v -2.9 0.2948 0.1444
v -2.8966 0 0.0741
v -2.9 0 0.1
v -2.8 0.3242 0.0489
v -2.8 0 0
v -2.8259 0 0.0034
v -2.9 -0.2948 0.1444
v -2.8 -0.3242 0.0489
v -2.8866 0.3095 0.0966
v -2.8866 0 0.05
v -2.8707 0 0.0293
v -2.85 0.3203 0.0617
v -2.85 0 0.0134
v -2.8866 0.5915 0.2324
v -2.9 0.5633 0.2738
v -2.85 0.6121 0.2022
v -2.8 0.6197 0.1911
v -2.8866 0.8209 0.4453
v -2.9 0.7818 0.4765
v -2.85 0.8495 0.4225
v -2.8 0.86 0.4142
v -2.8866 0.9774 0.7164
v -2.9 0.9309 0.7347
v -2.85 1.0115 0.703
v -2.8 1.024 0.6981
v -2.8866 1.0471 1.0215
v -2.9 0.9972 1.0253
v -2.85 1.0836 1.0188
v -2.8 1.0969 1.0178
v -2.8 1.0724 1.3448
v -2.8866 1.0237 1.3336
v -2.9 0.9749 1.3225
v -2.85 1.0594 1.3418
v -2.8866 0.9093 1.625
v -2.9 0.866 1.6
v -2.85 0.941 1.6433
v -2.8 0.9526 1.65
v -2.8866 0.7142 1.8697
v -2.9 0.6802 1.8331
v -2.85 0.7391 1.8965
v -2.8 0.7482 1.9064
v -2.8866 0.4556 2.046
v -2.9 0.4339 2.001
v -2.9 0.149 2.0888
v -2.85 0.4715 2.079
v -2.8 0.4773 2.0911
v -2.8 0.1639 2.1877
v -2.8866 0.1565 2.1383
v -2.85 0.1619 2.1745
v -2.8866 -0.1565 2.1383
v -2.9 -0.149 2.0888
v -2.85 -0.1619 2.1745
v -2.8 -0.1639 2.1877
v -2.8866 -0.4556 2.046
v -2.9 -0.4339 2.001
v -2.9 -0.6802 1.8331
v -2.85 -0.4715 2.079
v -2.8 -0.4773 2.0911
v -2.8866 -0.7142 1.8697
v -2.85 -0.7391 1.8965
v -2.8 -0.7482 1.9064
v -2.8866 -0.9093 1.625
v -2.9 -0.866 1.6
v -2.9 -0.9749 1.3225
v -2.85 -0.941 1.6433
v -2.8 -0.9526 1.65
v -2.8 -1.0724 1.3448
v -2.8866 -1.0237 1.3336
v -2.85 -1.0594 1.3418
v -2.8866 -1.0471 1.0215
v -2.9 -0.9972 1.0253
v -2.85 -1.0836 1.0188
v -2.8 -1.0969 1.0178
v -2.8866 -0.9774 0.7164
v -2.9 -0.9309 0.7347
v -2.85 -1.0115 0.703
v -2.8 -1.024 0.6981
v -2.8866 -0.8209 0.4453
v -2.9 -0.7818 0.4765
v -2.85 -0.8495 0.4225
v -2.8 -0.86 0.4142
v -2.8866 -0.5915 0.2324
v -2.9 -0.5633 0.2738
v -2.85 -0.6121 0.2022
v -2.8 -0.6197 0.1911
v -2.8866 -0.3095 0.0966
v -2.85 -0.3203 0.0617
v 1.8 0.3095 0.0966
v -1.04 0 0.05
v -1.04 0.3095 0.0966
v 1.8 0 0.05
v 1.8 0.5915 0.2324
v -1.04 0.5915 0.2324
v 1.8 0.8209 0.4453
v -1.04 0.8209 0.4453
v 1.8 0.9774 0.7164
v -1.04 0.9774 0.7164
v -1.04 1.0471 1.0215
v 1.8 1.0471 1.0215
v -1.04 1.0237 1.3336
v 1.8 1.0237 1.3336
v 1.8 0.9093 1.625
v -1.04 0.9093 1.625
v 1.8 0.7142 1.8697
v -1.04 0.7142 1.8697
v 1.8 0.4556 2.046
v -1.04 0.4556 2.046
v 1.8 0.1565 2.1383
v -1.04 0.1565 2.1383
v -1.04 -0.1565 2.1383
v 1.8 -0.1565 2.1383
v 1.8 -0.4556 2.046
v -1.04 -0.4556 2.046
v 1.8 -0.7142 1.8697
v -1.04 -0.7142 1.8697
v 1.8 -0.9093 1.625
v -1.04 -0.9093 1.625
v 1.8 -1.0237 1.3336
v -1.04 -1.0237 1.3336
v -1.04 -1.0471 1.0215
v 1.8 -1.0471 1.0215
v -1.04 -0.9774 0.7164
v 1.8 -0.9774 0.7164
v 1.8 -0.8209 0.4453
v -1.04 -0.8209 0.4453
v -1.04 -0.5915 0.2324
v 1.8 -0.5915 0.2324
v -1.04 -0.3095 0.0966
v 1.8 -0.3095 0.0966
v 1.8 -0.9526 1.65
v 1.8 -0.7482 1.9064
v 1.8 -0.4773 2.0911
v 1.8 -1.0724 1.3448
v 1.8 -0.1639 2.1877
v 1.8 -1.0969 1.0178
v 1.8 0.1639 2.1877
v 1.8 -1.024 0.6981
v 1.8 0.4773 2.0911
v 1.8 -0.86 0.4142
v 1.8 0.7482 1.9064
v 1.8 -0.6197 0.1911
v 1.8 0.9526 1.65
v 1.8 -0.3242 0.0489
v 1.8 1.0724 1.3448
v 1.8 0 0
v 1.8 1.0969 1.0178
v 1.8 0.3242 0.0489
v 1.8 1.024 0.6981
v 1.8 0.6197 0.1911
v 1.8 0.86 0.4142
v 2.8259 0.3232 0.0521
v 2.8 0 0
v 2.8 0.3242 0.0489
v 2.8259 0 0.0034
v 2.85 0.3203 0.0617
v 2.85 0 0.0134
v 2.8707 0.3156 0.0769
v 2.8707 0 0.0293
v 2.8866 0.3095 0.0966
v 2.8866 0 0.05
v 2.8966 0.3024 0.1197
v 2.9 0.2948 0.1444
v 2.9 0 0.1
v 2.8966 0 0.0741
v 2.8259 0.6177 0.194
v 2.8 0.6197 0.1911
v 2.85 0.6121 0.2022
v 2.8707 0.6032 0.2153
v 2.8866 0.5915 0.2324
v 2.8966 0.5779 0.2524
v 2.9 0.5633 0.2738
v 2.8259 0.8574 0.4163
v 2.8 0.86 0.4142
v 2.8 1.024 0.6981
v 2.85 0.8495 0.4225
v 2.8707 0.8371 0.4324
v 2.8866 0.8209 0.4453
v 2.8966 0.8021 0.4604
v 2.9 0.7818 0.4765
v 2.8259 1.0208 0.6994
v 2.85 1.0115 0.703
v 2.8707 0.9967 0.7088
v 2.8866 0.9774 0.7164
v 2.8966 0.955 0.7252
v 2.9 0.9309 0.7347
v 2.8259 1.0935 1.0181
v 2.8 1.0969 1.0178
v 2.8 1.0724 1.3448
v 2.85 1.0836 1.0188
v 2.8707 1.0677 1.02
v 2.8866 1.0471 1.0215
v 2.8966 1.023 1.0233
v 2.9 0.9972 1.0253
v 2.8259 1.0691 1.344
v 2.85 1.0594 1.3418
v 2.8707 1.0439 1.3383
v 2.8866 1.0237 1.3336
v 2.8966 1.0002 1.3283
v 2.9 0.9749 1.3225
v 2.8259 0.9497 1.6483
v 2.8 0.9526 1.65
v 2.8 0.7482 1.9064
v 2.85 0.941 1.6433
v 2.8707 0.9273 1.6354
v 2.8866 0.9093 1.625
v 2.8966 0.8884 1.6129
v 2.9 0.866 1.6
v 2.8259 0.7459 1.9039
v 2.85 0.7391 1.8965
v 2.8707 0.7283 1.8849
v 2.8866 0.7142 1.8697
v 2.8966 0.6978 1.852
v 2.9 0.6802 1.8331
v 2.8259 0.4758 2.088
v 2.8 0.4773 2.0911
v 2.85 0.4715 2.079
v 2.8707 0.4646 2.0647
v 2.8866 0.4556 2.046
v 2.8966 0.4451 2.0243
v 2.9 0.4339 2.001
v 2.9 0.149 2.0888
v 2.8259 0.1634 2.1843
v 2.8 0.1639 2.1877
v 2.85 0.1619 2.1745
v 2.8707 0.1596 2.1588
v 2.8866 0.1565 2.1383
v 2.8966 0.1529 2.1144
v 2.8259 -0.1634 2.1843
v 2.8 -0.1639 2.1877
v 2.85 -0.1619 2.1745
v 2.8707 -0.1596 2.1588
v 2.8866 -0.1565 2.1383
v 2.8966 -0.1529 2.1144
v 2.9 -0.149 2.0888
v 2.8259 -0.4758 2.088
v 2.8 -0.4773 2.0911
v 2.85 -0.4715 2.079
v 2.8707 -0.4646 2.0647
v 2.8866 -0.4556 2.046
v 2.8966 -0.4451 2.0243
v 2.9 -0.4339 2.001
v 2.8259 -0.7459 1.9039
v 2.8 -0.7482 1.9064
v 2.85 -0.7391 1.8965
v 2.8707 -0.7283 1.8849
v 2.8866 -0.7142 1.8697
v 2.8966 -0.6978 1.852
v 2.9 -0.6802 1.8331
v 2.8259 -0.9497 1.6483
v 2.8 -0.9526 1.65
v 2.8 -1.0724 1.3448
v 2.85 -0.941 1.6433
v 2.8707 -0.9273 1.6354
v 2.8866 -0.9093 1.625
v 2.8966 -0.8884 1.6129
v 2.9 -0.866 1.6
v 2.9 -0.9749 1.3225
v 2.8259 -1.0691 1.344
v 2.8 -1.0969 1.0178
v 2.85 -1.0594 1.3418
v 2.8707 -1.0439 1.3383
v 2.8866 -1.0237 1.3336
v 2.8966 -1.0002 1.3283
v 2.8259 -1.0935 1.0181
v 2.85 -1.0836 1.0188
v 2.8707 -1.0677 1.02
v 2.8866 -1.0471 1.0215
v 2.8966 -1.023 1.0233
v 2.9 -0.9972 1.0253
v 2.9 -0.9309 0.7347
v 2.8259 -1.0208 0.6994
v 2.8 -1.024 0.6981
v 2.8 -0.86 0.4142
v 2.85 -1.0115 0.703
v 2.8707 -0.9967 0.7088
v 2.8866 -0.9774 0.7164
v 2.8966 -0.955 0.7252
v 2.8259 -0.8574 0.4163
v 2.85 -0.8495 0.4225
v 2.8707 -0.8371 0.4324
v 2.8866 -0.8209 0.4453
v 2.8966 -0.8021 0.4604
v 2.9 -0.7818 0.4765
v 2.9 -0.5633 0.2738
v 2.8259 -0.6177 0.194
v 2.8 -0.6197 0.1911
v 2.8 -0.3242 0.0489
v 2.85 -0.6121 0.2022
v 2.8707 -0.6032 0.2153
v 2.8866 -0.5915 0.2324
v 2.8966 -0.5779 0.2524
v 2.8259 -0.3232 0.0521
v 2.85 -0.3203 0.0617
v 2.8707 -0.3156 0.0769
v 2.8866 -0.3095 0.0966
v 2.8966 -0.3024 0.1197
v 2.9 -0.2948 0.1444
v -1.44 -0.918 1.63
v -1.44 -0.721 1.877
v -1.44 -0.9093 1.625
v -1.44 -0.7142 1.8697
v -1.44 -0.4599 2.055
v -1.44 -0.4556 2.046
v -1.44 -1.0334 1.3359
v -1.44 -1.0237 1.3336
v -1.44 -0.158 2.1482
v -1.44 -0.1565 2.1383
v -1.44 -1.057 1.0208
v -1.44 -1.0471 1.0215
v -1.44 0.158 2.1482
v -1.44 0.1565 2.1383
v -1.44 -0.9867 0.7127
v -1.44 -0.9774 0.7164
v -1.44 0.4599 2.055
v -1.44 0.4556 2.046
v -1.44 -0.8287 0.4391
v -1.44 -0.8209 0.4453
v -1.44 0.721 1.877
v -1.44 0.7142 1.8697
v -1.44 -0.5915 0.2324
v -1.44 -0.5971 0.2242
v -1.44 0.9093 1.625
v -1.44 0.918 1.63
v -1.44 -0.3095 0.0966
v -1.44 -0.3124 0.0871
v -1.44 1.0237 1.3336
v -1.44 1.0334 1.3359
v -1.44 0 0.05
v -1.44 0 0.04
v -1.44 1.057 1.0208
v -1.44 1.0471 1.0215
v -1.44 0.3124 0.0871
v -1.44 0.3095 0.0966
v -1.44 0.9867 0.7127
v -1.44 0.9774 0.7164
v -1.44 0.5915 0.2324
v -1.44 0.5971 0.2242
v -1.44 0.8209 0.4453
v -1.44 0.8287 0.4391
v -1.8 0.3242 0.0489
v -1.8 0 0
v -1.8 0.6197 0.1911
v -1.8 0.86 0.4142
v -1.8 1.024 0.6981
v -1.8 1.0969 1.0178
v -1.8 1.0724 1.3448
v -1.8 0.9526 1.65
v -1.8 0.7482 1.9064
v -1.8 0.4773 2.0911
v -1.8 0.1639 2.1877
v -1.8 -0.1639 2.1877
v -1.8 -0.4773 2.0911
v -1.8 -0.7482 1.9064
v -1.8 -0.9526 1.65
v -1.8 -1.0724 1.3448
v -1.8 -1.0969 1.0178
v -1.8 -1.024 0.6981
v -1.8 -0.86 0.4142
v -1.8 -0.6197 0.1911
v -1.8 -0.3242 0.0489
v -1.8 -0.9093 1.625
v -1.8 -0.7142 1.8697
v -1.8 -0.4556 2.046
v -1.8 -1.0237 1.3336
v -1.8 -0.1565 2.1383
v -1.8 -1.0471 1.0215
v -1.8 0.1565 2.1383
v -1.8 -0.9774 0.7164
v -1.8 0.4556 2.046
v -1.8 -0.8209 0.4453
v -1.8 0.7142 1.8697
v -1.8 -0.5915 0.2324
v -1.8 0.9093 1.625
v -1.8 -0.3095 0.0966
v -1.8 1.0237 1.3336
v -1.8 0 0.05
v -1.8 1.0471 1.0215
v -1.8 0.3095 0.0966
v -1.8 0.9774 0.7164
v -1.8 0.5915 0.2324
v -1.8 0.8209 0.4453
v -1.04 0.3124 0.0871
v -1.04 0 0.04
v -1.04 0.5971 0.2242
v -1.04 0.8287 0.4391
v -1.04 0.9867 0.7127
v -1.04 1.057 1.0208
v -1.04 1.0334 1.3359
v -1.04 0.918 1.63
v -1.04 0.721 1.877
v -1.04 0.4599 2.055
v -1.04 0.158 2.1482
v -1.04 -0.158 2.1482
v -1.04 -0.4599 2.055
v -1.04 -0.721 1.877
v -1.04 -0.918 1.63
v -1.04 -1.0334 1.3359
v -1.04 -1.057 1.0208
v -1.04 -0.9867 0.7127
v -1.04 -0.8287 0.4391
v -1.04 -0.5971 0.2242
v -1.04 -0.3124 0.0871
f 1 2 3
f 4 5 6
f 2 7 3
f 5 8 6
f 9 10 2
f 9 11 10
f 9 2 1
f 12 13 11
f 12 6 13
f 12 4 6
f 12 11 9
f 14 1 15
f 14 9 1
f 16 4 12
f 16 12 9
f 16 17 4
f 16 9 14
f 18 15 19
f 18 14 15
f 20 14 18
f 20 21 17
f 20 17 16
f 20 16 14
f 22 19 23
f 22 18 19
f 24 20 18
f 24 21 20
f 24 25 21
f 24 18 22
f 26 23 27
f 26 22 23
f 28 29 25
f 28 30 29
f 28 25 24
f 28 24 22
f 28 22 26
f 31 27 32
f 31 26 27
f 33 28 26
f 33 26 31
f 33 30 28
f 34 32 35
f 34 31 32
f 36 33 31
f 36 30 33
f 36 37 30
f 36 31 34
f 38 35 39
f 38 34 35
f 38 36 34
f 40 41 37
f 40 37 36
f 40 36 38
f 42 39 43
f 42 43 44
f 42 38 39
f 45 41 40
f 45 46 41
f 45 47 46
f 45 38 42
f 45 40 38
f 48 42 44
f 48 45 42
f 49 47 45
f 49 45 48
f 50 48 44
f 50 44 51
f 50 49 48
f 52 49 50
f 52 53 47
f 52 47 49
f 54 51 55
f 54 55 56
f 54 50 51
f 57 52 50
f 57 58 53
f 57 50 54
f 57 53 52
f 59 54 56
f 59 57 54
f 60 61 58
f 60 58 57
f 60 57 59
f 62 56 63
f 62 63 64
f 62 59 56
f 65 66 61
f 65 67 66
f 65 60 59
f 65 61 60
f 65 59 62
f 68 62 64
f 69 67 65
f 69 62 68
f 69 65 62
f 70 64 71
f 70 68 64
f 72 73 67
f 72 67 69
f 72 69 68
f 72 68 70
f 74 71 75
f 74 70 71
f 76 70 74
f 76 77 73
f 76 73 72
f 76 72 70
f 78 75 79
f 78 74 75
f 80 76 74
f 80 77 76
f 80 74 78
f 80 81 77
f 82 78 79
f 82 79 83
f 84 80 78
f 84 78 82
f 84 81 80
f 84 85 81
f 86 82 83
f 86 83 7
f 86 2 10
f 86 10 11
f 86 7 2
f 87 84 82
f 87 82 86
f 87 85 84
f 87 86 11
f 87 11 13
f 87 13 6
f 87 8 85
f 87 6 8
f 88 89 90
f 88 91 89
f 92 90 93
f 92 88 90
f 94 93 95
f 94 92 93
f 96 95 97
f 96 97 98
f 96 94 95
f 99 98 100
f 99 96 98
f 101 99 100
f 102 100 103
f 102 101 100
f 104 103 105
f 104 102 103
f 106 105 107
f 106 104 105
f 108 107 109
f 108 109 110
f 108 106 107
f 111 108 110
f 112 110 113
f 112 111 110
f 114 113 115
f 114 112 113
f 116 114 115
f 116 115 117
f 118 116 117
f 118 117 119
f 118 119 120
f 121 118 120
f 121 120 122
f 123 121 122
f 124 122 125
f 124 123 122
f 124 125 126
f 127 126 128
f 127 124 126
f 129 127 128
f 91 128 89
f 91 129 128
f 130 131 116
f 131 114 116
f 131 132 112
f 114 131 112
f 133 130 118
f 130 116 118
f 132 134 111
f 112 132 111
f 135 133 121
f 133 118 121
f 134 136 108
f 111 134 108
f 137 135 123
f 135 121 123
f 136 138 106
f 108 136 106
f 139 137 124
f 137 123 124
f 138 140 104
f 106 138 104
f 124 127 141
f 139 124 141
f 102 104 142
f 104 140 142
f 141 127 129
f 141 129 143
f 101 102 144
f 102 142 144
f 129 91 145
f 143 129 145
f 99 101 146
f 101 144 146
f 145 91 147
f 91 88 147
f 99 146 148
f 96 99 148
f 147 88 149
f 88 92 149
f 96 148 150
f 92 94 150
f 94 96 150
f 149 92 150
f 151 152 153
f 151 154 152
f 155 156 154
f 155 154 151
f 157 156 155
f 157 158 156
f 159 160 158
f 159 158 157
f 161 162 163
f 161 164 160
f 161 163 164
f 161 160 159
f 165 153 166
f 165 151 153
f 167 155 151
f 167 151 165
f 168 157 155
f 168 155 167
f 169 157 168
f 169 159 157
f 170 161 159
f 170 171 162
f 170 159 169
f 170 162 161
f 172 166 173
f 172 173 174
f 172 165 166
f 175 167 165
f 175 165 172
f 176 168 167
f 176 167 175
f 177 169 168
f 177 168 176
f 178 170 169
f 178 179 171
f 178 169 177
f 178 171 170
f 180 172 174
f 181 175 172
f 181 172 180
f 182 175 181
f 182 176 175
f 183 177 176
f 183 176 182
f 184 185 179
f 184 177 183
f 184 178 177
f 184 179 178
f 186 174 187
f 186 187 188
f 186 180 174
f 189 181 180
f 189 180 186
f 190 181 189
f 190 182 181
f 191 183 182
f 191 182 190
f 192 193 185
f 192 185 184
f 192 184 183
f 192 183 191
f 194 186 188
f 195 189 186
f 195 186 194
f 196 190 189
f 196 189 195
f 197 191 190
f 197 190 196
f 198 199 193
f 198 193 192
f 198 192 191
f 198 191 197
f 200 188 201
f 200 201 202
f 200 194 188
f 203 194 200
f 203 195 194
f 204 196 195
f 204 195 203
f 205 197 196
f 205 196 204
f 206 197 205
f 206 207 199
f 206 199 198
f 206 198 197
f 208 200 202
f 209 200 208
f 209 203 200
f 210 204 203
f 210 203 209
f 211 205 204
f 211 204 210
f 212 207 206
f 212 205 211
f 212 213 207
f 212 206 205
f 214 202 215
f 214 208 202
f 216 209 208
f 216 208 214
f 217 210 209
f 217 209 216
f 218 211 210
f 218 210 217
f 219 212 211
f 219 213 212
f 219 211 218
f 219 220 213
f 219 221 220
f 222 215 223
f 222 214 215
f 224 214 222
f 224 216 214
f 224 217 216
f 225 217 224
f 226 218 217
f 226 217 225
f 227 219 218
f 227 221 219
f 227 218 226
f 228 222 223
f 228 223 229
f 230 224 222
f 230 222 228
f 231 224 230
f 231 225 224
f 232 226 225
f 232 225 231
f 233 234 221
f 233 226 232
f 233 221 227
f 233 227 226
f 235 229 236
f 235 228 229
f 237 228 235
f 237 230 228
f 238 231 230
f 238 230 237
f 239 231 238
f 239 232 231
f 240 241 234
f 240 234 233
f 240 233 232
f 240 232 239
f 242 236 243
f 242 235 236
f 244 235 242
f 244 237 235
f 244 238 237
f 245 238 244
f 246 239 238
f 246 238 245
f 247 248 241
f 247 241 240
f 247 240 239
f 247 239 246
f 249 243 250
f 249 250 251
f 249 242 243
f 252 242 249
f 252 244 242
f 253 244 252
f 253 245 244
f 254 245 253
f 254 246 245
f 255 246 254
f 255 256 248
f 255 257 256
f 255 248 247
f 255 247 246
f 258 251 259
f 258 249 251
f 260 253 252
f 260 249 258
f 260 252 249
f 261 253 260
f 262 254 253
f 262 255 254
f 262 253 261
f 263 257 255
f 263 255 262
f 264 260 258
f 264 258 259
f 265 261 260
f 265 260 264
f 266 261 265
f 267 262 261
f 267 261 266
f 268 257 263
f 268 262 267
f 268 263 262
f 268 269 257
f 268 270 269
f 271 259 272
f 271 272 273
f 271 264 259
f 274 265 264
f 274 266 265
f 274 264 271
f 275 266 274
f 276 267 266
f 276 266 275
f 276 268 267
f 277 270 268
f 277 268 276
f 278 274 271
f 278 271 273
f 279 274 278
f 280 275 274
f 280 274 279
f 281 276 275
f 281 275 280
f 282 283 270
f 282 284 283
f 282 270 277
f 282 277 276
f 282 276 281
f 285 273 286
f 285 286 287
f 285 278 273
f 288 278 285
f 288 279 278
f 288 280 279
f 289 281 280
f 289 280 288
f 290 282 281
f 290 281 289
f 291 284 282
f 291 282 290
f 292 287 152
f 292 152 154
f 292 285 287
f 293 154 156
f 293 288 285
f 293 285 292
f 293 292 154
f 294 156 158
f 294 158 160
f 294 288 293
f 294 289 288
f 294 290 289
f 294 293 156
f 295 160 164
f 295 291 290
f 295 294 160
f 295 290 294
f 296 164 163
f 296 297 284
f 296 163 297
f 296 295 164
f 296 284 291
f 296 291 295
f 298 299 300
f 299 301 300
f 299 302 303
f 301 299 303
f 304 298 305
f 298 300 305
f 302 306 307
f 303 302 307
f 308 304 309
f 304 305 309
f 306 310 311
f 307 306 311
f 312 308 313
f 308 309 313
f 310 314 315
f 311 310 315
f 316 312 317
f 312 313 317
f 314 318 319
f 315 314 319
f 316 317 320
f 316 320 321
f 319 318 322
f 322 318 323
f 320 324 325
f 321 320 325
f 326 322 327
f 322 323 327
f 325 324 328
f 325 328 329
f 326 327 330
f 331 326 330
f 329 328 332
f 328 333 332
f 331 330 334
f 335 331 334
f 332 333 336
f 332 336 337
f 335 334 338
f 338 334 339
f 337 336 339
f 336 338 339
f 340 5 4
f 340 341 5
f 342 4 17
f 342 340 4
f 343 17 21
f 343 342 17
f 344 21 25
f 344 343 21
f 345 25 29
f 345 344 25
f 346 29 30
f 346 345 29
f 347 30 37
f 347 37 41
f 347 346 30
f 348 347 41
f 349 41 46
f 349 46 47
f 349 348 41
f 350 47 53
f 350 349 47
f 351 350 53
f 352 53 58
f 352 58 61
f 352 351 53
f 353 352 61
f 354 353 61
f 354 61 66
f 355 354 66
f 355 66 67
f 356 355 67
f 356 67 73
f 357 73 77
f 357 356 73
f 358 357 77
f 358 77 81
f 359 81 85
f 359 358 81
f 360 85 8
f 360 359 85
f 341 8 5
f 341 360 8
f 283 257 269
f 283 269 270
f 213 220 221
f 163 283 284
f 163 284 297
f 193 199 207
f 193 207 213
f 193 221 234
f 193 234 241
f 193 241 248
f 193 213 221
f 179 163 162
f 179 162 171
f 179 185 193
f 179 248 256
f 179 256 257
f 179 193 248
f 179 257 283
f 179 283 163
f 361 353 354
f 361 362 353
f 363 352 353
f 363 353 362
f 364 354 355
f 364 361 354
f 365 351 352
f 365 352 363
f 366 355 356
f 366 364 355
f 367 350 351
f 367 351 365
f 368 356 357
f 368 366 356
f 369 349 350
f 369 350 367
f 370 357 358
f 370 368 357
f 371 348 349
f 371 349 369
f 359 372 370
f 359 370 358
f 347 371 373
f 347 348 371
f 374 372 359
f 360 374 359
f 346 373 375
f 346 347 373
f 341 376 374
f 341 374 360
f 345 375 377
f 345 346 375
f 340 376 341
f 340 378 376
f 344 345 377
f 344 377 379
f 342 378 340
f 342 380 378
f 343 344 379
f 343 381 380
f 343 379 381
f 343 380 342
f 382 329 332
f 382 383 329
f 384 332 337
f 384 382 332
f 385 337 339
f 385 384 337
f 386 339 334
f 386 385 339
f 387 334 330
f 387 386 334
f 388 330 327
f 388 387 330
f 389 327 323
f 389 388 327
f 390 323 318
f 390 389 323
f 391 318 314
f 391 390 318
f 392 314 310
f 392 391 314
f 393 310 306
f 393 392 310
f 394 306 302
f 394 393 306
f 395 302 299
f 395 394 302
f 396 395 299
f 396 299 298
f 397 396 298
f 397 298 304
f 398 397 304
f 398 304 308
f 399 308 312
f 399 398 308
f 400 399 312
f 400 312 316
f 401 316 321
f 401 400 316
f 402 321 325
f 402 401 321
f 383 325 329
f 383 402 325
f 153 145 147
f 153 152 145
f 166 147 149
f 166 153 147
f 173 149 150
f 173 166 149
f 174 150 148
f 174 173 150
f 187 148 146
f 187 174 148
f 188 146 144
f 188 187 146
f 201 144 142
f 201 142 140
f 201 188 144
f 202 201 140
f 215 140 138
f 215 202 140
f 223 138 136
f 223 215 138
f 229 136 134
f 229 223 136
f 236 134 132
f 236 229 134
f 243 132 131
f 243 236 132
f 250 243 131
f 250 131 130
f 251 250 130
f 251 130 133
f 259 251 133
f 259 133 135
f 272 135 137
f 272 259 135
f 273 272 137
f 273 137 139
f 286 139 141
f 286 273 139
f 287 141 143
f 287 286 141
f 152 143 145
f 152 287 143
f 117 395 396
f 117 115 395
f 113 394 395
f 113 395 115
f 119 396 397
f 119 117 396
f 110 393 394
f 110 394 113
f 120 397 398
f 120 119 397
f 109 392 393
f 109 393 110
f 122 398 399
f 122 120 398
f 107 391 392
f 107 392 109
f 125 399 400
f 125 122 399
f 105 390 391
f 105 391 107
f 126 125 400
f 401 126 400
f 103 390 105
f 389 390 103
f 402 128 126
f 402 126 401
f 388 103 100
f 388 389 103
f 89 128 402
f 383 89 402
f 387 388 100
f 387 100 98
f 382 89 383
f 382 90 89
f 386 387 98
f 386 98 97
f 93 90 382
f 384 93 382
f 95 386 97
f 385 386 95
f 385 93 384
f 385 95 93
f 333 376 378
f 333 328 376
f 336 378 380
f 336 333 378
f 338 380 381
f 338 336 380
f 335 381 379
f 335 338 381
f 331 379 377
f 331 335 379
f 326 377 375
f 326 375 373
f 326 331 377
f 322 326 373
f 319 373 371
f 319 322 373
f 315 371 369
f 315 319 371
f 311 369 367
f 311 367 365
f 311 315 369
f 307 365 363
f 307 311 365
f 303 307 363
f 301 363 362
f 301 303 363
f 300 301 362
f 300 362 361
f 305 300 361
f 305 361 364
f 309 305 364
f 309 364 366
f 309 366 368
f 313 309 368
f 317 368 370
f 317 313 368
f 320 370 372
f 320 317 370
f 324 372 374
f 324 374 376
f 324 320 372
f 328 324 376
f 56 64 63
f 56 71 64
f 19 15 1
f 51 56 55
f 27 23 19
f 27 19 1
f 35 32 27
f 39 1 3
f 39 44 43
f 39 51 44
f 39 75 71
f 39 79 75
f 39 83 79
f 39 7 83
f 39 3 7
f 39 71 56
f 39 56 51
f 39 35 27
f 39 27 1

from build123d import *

# Parameters (mm, degrees)
SKETCH_W    = 4.7
SKETCH_H    = 1.05
SKETCH002_W = 0.4
SKETCH002_H = 1.06


with BuildPart() as revolution001:
    # Sketch001 → Revolution001 (revolve)
    with BuildSketch(Plane.XZ):
        with BuildLine():
            Line((-2.8, 0), (-1.8, 0))
            Line((-1.8, 0), (-1.8, 1))
            Line((-1.8, 1), (1.8, 1))
            Line((1.8, 0), (1.8, 1))
            Line((1.8, 0), (2.8, 0))
            ThreePointArc((2.8, 0), (2.870711, 0.029289), (2.9, 0.1))
            Line((2.9, 0.1), (2.9, 1.1))
            Line((-2.9, 1.1), (2.9, 1.1))
            Line((-2.9, 1.1), (-2.9, 0.1))
            ThreePointArc((-2.9, 0.1), (-2.870711, 0.029289), (-2.8, 0))
        make_face()
    revolve(axis=Axis((-7.1, 0, 1.1), (1, 0, 0)))


with BuildPart() as revolution:
    # Sketch → Revolution (revolve)
    with BuildSketch(Plane.XZ):
        with Locations((0, 0.575)):
            Rectangle(SKETCH_W, SKETCH_H)
    revolve(axis=Axis((-15.061842, 0, 1.1), (1, 0, 0)))


with BuildPart() as d_melf_standard:
    # Sketch002 → Revolution002 (revolve)
    with BuildSketch(Plane.XZ):
        with Locations((-1.24, 0.57)):
            Rectangle(SKETCH002_W, SKETCH002_H)
    revolve(axis=Axis((-15.061842, 0, 1.1), (1, 0, 0)))

    # Fusion: union Revolution001, Revolution
    add(revolution001.part)
    add(revolution.part)


solid = d_melf_standard.part
